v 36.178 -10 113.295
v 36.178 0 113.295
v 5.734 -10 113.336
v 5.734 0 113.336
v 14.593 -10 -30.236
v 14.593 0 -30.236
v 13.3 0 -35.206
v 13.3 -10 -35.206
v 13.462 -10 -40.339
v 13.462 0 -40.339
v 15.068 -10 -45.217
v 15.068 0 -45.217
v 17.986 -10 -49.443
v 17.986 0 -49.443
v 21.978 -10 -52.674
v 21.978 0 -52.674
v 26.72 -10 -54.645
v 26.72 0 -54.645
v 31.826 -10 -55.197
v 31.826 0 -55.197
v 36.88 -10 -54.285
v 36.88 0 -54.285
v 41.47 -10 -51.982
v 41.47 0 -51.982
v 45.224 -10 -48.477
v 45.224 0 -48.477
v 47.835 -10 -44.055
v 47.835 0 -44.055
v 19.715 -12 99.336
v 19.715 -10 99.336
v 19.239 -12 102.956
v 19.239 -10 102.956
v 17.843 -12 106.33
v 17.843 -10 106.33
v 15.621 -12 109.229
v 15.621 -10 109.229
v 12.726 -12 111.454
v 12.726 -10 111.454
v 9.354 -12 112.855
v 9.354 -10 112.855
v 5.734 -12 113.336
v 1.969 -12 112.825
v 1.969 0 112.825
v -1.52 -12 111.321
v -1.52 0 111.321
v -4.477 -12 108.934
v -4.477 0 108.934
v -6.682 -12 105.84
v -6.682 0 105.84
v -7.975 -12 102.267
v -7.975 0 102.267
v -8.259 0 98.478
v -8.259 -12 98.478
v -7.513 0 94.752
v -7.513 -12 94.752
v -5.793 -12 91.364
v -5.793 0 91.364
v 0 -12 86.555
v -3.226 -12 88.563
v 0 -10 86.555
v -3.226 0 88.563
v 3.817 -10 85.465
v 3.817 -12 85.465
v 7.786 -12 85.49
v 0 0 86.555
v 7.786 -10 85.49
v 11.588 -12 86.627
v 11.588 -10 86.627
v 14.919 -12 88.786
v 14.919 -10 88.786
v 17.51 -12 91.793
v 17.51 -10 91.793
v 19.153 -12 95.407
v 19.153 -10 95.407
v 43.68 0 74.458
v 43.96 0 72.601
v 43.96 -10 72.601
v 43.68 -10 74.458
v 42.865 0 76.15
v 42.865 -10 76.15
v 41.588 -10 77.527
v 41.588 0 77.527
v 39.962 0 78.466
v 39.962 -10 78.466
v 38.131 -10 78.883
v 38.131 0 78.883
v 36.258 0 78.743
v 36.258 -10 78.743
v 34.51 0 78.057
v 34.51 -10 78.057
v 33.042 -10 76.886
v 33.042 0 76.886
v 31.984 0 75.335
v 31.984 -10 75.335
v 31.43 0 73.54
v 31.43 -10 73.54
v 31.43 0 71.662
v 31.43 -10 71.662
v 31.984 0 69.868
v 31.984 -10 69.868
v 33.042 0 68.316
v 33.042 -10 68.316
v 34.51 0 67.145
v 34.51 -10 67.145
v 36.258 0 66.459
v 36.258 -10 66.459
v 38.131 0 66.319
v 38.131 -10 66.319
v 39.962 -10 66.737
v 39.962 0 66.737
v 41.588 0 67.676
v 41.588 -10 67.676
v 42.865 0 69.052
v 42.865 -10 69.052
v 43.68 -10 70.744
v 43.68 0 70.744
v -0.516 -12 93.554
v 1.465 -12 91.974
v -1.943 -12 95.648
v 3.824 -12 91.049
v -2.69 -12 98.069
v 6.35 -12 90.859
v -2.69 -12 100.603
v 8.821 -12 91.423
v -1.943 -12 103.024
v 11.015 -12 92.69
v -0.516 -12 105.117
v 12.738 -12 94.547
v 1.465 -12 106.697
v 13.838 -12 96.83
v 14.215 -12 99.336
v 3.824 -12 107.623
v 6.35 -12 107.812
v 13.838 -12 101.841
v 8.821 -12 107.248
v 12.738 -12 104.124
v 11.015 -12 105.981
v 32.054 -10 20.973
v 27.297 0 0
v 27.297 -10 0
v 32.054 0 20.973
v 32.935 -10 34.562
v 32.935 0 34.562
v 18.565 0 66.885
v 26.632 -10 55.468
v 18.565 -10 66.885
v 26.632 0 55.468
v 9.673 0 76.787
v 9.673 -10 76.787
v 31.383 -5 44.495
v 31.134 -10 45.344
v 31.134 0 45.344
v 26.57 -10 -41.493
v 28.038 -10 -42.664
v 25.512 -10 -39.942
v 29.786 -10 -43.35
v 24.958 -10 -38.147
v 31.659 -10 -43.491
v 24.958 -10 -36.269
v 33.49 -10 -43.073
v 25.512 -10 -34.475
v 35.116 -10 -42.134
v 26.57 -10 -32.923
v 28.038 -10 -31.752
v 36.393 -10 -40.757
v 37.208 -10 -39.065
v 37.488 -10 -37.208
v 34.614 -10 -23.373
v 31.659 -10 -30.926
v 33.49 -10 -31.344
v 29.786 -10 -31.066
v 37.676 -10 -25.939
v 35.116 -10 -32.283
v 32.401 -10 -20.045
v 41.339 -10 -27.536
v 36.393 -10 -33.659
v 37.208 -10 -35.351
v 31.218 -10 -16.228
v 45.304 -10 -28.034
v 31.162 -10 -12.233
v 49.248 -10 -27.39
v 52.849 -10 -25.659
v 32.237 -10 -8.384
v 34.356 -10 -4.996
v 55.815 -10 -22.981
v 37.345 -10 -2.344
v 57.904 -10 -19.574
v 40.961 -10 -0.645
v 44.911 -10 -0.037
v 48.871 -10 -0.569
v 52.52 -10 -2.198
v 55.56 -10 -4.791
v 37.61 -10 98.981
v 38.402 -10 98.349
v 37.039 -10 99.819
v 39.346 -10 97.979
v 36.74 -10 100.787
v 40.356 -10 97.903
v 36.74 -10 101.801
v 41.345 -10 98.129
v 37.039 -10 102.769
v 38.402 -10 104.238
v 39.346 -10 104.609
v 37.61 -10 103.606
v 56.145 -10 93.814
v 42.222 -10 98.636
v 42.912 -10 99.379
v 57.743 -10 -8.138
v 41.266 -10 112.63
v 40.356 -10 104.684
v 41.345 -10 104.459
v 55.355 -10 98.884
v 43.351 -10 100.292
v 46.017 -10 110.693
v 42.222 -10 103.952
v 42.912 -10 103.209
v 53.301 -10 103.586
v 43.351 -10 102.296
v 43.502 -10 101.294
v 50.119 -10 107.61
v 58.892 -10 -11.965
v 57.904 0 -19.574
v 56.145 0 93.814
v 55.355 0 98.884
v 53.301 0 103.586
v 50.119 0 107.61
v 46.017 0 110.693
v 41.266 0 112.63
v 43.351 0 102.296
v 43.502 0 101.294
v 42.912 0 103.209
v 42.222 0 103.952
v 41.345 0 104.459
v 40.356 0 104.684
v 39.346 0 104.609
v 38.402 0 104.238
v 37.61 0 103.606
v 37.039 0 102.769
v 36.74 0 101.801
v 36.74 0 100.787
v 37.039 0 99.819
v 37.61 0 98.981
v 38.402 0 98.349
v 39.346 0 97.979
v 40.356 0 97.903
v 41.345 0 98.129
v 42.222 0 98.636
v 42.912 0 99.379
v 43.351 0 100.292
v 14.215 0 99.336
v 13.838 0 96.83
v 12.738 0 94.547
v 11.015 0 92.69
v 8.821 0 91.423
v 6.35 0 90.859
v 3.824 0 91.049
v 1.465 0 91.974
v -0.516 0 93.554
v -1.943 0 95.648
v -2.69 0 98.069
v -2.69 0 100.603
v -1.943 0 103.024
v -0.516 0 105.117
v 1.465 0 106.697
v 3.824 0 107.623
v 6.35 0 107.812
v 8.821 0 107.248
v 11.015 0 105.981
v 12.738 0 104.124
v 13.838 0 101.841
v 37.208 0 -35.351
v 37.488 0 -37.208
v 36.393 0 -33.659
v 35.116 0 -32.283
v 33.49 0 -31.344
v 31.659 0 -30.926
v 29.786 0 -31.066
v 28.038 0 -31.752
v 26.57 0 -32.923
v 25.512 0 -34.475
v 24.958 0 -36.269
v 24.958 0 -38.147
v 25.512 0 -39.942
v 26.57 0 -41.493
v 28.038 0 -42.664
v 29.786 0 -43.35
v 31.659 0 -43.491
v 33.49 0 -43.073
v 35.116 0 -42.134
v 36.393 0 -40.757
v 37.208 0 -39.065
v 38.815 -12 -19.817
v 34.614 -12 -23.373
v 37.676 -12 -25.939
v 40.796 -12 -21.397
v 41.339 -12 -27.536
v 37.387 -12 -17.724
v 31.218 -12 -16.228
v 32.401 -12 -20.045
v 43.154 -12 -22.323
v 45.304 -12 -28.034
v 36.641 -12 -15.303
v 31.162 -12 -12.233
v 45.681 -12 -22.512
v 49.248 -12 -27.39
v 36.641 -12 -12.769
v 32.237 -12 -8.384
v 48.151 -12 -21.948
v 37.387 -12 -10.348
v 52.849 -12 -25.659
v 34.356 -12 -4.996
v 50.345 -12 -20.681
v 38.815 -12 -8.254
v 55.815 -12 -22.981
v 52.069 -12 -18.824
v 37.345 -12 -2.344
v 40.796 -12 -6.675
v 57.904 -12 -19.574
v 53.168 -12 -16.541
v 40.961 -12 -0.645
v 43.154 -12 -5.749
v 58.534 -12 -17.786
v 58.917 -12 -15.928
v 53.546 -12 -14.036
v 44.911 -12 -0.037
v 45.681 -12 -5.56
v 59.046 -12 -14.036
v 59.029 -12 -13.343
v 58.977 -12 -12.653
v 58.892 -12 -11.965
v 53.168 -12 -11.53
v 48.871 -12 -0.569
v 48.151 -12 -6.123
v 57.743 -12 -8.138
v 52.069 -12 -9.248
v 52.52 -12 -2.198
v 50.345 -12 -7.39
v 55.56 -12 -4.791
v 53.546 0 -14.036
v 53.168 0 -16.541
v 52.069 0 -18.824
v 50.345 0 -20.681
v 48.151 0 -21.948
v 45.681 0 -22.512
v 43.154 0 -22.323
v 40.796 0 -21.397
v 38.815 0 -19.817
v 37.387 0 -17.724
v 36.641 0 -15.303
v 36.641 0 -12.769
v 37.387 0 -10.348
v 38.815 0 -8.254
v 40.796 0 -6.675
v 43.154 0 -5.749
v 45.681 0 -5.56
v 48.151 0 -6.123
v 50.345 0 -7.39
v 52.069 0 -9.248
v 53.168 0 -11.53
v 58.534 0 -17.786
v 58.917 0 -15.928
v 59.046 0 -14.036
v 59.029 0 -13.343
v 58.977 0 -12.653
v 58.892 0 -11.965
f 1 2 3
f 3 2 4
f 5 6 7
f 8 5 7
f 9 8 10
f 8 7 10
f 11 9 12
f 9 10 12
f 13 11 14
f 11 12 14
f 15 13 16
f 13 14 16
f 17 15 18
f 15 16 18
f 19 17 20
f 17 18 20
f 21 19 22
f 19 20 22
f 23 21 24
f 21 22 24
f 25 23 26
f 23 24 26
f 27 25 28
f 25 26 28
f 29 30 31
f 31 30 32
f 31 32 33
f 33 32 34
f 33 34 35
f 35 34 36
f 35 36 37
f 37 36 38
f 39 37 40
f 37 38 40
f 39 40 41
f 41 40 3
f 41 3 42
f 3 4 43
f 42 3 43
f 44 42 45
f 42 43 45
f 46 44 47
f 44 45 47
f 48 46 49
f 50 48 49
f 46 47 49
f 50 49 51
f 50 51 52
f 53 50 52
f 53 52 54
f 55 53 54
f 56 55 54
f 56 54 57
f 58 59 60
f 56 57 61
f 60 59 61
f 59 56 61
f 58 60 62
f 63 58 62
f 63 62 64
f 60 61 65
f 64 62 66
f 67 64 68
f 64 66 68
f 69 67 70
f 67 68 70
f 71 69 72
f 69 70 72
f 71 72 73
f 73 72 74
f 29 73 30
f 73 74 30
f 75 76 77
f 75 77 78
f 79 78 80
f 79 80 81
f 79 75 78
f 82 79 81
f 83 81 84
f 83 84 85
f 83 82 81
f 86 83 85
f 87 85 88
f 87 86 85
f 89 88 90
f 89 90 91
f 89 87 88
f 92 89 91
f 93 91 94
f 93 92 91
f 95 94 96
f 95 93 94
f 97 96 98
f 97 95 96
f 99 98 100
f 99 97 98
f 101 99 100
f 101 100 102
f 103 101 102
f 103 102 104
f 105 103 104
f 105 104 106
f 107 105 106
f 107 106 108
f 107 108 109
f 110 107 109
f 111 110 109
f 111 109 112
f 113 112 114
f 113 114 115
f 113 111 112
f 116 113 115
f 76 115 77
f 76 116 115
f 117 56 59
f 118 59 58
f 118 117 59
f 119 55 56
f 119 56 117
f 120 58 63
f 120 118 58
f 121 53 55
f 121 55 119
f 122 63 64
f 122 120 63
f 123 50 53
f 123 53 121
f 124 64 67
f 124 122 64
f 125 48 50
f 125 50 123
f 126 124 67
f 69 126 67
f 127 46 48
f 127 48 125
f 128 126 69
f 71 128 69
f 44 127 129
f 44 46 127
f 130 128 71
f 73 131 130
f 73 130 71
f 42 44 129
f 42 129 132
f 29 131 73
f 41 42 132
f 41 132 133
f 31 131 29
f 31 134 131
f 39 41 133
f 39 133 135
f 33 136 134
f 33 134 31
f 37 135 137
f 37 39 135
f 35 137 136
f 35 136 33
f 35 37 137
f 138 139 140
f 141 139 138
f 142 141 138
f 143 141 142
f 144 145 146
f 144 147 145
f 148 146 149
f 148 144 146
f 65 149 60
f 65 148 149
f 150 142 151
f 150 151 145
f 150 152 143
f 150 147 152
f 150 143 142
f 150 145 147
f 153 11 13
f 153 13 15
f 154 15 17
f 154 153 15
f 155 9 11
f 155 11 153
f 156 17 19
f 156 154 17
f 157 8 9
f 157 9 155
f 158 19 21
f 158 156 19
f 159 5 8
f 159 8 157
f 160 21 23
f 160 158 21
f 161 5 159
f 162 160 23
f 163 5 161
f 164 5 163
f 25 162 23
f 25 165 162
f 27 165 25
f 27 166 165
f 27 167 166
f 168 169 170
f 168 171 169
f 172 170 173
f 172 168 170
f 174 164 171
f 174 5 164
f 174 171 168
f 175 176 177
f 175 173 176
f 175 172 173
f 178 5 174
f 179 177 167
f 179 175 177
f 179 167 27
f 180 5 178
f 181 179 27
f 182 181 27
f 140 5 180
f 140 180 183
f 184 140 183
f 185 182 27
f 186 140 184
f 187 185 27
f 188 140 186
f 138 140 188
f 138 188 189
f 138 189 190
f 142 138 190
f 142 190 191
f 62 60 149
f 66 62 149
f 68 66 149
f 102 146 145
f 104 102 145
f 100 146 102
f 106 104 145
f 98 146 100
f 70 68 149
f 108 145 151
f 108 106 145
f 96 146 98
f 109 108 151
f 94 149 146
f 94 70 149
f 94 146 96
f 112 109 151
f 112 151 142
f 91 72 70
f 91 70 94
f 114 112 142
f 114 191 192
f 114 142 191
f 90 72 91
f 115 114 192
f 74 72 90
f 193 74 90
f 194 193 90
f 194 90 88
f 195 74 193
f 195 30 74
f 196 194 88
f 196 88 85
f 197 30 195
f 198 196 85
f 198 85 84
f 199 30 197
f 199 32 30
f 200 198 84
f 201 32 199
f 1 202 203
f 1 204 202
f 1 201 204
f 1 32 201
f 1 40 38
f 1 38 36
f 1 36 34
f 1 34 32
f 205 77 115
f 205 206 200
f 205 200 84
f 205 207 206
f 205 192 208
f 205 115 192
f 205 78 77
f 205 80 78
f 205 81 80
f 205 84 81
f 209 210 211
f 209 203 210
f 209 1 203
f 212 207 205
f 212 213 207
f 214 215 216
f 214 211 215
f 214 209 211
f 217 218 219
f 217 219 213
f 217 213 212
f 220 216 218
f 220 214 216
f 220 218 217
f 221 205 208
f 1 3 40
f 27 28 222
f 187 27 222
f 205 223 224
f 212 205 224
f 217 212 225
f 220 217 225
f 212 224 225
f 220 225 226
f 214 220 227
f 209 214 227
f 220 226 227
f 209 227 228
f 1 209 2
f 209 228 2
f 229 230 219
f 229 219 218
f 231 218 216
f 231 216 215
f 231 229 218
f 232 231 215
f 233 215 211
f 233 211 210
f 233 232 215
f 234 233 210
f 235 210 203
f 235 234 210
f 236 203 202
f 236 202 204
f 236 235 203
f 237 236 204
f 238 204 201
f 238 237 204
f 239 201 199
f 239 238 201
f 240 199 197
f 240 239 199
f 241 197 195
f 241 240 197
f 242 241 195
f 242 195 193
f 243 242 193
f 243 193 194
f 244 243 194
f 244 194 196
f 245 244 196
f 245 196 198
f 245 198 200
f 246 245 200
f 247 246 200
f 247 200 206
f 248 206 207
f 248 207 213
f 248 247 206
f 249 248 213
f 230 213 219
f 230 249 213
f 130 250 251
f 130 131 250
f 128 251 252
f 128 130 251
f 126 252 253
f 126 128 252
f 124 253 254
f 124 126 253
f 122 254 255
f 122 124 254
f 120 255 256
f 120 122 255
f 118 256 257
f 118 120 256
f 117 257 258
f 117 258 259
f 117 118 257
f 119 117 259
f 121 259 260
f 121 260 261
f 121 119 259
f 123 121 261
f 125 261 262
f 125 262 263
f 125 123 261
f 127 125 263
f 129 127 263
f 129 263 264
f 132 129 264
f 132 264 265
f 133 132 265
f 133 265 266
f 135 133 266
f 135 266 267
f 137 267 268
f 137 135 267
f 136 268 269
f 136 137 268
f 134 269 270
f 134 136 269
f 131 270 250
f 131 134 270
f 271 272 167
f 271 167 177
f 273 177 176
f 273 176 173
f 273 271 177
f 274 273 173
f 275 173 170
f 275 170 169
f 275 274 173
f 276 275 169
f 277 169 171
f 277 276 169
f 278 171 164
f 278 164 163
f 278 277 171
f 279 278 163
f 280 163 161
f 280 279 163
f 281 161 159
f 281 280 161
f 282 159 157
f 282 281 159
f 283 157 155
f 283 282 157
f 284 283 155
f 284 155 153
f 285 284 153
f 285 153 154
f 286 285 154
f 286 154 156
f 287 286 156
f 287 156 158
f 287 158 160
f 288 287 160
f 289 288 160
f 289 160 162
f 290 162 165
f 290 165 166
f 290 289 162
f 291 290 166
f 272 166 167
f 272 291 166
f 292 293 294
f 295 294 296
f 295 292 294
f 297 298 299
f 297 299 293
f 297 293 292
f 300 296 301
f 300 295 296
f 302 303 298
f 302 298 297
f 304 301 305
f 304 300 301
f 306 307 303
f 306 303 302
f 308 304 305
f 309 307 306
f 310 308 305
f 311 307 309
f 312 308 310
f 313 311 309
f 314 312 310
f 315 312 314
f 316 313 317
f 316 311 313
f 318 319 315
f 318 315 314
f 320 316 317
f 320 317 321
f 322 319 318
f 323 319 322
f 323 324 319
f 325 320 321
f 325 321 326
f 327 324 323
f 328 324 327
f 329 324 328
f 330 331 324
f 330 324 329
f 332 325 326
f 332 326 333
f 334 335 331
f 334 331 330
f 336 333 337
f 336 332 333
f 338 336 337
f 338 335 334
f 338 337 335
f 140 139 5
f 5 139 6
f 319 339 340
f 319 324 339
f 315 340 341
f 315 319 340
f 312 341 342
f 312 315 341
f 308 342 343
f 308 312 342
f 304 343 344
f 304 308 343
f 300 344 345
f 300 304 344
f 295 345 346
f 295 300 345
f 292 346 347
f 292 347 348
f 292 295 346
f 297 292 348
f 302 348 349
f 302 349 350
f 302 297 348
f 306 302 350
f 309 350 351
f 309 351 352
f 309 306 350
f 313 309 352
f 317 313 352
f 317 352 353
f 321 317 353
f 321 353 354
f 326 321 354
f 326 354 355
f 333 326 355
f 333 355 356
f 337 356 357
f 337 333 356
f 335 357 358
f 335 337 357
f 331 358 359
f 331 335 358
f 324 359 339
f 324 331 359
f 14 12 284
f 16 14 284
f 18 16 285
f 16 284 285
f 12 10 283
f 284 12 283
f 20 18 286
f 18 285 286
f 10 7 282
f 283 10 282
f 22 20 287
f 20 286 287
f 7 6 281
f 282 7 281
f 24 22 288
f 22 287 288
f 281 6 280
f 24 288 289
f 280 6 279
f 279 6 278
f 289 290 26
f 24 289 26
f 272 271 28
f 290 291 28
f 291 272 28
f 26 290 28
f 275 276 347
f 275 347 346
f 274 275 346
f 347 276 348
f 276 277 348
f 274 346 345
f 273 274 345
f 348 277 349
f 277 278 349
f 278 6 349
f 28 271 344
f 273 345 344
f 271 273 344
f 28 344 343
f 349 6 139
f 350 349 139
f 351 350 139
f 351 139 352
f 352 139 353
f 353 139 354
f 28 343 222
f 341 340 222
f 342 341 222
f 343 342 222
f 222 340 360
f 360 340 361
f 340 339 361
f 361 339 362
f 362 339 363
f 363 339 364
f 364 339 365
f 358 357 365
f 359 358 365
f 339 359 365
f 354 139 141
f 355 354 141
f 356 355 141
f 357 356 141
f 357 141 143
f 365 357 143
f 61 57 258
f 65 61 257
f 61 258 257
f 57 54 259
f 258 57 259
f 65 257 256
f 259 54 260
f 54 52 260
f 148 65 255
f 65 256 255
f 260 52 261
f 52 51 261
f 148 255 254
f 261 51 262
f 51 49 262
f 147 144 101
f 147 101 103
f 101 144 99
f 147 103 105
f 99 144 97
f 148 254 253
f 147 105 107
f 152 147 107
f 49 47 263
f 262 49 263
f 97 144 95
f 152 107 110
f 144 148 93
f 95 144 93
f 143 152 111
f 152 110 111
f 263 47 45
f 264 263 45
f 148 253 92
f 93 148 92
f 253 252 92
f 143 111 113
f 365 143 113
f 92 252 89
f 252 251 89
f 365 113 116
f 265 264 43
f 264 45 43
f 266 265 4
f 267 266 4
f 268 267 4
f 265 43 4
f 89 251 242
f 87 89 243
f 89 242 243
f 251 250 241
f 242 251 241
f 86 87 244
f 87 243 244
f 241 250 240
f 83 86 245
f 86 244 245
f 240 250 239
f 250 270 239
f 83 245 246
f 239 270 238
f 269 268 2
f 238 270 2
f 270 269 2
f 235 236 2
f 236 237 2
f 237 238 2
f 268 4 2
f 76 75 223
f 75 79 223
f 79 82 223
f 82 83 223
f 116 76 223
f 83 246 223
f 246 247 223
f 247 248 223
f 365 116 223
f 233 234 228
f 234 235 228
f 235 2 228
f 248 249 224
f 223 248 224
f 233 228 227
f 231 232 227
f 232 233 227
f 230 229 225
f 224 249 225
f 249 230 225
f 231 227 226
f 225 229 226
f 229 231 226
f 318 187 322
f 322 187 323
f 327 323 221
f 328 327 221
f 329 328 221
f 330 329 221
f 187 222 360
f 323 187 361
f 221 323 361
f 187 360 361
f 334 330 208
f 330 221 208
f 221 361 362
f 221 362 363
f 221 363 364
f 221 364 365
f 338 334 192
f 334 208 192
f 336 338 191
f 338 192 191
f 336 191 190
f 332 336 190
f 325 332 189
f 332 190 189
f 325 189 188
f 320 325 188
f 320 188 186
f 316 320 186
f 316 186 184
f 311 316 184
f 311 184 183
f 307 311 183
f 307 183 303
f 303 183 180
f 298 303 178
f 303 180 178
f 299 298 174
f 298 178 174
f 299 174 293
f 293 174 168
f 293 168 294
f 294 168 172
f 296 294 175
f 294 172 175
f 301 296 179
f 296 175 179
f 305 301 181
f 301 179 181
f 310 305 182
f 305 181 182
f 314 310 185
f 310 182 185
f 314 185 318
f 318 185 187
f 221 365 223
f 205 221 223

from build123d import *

# Parameters (mm, degrees)
F0_R     = 9
F0_R_2   = 3.4
F0_R_3   = 8.5
F0_R_4   = 6.3
F1_DEPTH = 10
F2_DEPTH = 12
F3_DEPTH = 10
F4_DEPTH = 10
F5_DEPTH = 10
F6_DEPTH = 12
F7_DEPTH = 10
F8_DEPTH = 10


# Not quite as in the source:
# - a feature names something its author has since deleted; it is built from what else it names


with BuildPart() as f1:
    # F0 (on Front) → F1 (new body)
    with BuildSketch(Plane.XZ):
        with BuildLine():
            ThreePointArc((57.9036016774, -19.5744080829), (31.1623185662, -12.2328702689), (58.8917768446, -11.9653941064))
            Line((58.8917768446, -11.9653941064), (56.1448434713, 93.81412645))
            ThreePointArc((56.1448434713, 93.81412645), (50.11852804, 107.6101149154), (36.1783402733, 113.2949139834))
            Line((36.1783402733, 113.2949139834), (5.7339191772, 113.3356434663))
            ThreePointArc((5.7339191772, 113.3356434663), (15.6213042052, 109.2285267967), (19.7151895633, 99.3356559948))
            ThreePointArc((19.7151895633, 99.3356559948), (13.3305472737, 87.5880465809), (0, 86.5553348621))
            add(Edge.make_bspline(
                [(27.2971690085, 0), (31.3022406236, 15.2863604375), (39.6477401648, 47.1390527935), (13.5652800367, 73.0692470789), (0, 86.5553348621)],
                knots=[0, 0, 0, 0, 0.4799079546, 1, 1, 1, 1], degree=3))
            Line((27.2971690085, 0), (14.5932951458, -30.2359827701))
            ThreePointArc((14.5932951458, -30.2359827701), (24.2784471497, -53.8293852547), (47.8350505361, -44.0550695737))
            Line((47.8350505361, -44.0550695737), (57.9036016774, -19.5744080829))
        make_face()
        with Locations((31.1880399704, -37.2083886825)):
            Circle(F0_R, mode=Mode.SUBTRACT)
        with Locations((37.6598948849, 72.601060337)):
            Circle(F0_R, mode=Mode.SUBTRACT)
        with Locations((40.1023646421, 101.2938035134)):
            Circle(F0_R_2, mode=Mode.SUBTRACT)
        with BuildLine():
            ThreePointArc((57.9036016774, -19.5744080829), (58.7572249195, -16.863419789), (59.0457295684, -14.0358952114))
            ThreePointArc((59.0457295684, -14.0358952114), (59.0071883365, -12.9977868034), (58.8917768446, -11.9653941064))
            ThreePointArc((58.8917768446, -11.9653941064), (31.1623185662, -12.2328702689), (57.9036016774, -19.5744080829))
        make_face()
        with Locations((45.0457295684, -14.0358952114)):
            Circle(F0_R_3, mode=Mode.SUBTRACT)
        with BuildLine():
            ThreePointArc((19.7151895633, 99.3356559948), (15.6213042052, 109.2285267967), (5.7339191772, 113.3356434663))
            ThreePointArc((5.7339191772, 113.3356434663), (-7.9745381996, 102.2667571151), (0, 86.5553348621))
            ThreePointArc((0, 86.5553348621), (13.3305472737, 87.5880465809), (19.7151895633, 99.3356559948))
        make_face()
        with Locations((5.7151895633, 99.3356559948)):
            Circle(F0_R_3, mode=Mode.SUBTRACT)
        with Locations((37.6598948849, 72.601060337)):
            Circle(F0_R)
        with Locations((37.6598948849, 72.601060337)):
            Circle(F0_R_4, mode=Mode.SUBTRACT)
        with Locations((31.1880399704, -37.2083886825)):
            Circle(F0_R)
        with Locations((31.1880399704, -37.2083886825)):
            Circle(F0_R_4, mode=Mode.SUBTRACT)
        with Locations((45.0457295684, -14.0358952114)):
            Circle(F0_R_3)
        with Locations((5.7151895633, 99.3356559948)):
            Circle(F0_R_3)
        with Locations((31.1880399704, -37.2083886825)):
            Circle(F0_R_4)
        with Locations((37.6598948849, 72.601060337)):
            Circle(F0_R_4)
        with Locations((40.1023646421, 101.2938035134)):
            Circle(F0_R_2)
    extrude(amount=F1_DEPTH)

    # F0 (on Front) → F2 (join)
    with BuildSketch(Plane.XZ):
        with BuildLine():
            ThreePointArc((19.7151895633, 99.3356559948), (15.6213042052, 109.2285267967), (5.7339191772, 113.3356434663))
            ThreePointArc((5.7339191772, 113.3356434663), (-7.9745381996, 102.2667571151), (0, 86.5553348621))
            ThreePointArc((0, 86.5553348621), (13.3305472737, 87.5880465809), (19.7151895633, 99.3356559948))
        make_face()
        with Locations((5.7151895633, 99.3356559948)):
            Circle(F0_R_3, mode=Mode.SUBTRACT)
    extrude(amount=F2_DEPTH)

    # F3 (cut): a face of the model
    f3_faces = [f1.faces().sort_by_distance(p)[0] for p in [
        (5.7151895633, -10, 99.3356559948),
    ]]
    extrude(f3_faces, amount=-F3_DEPTH, mode=Mode.SUBTRACT)

    # F0 (on Front) → F4 (cut)
    with BuildSketch(Plane.XZ):
        with Locations((40.1023646421, 101.2938035134)):
            Circle(F0_R_2)
    extrude(amount=F4_DEPTH, mode=Mode.SUBTRACT)

    # F0 (on Front) → F5 (cut)
    with BuildSketch(Plane.XZ):
        with Locations((37.6598948849, 72.601060337)):
            Circle(F0_R_4)
    extrude(amount=F5_DEPTH, mode=Mode.SUBTRACT)

    # F0 (on Front) → F6 (join)
    with BuildSketch(Plane.XZ):
        with BuildLine():
            ThreePointArc((57.9036016774, -19.5744080829), (58.7572249195, -16.863419789), (59.0457295684, -14.0358952114))
            ThreePointArc((59.0457295684, -14.0358952114), (59.0071883365, -12.9977868034), (58.8917768446, -11.9653941064))
            ThreePointArc((58.8917768446, -11.9653941064), (31.1623185662, -12.2328702689), (57.9036016774, -19.5744080829))
        make_face()
        with Locations((45.0457295684, -14.0358952114)):
            Circle(F0_R_3, mode=Mode.SUBTRACT)
    extrude(amount=F6_DEPTH)

    # F7 (cut): a face of the model
    f7_faces = [f1.faces().sort_by_distance(p)[0] for p in [
        (45.0457295684, -10, -14.0358952114),
    ]]
    extrude(f7_faces, amount=-F7_DEPTH, mode=Mode.SUBTRACT)

    # F0 (on Front) → F8 (cut)
    with BuildSketch(Plane.XZ):
        with Locations((31.1880399704, -37.2083886825)):
            Circle(F0_R_4)
    extrude(amount=F8_DEPTH, mode=Mode.SUBTRACT)


solid = f1.part
